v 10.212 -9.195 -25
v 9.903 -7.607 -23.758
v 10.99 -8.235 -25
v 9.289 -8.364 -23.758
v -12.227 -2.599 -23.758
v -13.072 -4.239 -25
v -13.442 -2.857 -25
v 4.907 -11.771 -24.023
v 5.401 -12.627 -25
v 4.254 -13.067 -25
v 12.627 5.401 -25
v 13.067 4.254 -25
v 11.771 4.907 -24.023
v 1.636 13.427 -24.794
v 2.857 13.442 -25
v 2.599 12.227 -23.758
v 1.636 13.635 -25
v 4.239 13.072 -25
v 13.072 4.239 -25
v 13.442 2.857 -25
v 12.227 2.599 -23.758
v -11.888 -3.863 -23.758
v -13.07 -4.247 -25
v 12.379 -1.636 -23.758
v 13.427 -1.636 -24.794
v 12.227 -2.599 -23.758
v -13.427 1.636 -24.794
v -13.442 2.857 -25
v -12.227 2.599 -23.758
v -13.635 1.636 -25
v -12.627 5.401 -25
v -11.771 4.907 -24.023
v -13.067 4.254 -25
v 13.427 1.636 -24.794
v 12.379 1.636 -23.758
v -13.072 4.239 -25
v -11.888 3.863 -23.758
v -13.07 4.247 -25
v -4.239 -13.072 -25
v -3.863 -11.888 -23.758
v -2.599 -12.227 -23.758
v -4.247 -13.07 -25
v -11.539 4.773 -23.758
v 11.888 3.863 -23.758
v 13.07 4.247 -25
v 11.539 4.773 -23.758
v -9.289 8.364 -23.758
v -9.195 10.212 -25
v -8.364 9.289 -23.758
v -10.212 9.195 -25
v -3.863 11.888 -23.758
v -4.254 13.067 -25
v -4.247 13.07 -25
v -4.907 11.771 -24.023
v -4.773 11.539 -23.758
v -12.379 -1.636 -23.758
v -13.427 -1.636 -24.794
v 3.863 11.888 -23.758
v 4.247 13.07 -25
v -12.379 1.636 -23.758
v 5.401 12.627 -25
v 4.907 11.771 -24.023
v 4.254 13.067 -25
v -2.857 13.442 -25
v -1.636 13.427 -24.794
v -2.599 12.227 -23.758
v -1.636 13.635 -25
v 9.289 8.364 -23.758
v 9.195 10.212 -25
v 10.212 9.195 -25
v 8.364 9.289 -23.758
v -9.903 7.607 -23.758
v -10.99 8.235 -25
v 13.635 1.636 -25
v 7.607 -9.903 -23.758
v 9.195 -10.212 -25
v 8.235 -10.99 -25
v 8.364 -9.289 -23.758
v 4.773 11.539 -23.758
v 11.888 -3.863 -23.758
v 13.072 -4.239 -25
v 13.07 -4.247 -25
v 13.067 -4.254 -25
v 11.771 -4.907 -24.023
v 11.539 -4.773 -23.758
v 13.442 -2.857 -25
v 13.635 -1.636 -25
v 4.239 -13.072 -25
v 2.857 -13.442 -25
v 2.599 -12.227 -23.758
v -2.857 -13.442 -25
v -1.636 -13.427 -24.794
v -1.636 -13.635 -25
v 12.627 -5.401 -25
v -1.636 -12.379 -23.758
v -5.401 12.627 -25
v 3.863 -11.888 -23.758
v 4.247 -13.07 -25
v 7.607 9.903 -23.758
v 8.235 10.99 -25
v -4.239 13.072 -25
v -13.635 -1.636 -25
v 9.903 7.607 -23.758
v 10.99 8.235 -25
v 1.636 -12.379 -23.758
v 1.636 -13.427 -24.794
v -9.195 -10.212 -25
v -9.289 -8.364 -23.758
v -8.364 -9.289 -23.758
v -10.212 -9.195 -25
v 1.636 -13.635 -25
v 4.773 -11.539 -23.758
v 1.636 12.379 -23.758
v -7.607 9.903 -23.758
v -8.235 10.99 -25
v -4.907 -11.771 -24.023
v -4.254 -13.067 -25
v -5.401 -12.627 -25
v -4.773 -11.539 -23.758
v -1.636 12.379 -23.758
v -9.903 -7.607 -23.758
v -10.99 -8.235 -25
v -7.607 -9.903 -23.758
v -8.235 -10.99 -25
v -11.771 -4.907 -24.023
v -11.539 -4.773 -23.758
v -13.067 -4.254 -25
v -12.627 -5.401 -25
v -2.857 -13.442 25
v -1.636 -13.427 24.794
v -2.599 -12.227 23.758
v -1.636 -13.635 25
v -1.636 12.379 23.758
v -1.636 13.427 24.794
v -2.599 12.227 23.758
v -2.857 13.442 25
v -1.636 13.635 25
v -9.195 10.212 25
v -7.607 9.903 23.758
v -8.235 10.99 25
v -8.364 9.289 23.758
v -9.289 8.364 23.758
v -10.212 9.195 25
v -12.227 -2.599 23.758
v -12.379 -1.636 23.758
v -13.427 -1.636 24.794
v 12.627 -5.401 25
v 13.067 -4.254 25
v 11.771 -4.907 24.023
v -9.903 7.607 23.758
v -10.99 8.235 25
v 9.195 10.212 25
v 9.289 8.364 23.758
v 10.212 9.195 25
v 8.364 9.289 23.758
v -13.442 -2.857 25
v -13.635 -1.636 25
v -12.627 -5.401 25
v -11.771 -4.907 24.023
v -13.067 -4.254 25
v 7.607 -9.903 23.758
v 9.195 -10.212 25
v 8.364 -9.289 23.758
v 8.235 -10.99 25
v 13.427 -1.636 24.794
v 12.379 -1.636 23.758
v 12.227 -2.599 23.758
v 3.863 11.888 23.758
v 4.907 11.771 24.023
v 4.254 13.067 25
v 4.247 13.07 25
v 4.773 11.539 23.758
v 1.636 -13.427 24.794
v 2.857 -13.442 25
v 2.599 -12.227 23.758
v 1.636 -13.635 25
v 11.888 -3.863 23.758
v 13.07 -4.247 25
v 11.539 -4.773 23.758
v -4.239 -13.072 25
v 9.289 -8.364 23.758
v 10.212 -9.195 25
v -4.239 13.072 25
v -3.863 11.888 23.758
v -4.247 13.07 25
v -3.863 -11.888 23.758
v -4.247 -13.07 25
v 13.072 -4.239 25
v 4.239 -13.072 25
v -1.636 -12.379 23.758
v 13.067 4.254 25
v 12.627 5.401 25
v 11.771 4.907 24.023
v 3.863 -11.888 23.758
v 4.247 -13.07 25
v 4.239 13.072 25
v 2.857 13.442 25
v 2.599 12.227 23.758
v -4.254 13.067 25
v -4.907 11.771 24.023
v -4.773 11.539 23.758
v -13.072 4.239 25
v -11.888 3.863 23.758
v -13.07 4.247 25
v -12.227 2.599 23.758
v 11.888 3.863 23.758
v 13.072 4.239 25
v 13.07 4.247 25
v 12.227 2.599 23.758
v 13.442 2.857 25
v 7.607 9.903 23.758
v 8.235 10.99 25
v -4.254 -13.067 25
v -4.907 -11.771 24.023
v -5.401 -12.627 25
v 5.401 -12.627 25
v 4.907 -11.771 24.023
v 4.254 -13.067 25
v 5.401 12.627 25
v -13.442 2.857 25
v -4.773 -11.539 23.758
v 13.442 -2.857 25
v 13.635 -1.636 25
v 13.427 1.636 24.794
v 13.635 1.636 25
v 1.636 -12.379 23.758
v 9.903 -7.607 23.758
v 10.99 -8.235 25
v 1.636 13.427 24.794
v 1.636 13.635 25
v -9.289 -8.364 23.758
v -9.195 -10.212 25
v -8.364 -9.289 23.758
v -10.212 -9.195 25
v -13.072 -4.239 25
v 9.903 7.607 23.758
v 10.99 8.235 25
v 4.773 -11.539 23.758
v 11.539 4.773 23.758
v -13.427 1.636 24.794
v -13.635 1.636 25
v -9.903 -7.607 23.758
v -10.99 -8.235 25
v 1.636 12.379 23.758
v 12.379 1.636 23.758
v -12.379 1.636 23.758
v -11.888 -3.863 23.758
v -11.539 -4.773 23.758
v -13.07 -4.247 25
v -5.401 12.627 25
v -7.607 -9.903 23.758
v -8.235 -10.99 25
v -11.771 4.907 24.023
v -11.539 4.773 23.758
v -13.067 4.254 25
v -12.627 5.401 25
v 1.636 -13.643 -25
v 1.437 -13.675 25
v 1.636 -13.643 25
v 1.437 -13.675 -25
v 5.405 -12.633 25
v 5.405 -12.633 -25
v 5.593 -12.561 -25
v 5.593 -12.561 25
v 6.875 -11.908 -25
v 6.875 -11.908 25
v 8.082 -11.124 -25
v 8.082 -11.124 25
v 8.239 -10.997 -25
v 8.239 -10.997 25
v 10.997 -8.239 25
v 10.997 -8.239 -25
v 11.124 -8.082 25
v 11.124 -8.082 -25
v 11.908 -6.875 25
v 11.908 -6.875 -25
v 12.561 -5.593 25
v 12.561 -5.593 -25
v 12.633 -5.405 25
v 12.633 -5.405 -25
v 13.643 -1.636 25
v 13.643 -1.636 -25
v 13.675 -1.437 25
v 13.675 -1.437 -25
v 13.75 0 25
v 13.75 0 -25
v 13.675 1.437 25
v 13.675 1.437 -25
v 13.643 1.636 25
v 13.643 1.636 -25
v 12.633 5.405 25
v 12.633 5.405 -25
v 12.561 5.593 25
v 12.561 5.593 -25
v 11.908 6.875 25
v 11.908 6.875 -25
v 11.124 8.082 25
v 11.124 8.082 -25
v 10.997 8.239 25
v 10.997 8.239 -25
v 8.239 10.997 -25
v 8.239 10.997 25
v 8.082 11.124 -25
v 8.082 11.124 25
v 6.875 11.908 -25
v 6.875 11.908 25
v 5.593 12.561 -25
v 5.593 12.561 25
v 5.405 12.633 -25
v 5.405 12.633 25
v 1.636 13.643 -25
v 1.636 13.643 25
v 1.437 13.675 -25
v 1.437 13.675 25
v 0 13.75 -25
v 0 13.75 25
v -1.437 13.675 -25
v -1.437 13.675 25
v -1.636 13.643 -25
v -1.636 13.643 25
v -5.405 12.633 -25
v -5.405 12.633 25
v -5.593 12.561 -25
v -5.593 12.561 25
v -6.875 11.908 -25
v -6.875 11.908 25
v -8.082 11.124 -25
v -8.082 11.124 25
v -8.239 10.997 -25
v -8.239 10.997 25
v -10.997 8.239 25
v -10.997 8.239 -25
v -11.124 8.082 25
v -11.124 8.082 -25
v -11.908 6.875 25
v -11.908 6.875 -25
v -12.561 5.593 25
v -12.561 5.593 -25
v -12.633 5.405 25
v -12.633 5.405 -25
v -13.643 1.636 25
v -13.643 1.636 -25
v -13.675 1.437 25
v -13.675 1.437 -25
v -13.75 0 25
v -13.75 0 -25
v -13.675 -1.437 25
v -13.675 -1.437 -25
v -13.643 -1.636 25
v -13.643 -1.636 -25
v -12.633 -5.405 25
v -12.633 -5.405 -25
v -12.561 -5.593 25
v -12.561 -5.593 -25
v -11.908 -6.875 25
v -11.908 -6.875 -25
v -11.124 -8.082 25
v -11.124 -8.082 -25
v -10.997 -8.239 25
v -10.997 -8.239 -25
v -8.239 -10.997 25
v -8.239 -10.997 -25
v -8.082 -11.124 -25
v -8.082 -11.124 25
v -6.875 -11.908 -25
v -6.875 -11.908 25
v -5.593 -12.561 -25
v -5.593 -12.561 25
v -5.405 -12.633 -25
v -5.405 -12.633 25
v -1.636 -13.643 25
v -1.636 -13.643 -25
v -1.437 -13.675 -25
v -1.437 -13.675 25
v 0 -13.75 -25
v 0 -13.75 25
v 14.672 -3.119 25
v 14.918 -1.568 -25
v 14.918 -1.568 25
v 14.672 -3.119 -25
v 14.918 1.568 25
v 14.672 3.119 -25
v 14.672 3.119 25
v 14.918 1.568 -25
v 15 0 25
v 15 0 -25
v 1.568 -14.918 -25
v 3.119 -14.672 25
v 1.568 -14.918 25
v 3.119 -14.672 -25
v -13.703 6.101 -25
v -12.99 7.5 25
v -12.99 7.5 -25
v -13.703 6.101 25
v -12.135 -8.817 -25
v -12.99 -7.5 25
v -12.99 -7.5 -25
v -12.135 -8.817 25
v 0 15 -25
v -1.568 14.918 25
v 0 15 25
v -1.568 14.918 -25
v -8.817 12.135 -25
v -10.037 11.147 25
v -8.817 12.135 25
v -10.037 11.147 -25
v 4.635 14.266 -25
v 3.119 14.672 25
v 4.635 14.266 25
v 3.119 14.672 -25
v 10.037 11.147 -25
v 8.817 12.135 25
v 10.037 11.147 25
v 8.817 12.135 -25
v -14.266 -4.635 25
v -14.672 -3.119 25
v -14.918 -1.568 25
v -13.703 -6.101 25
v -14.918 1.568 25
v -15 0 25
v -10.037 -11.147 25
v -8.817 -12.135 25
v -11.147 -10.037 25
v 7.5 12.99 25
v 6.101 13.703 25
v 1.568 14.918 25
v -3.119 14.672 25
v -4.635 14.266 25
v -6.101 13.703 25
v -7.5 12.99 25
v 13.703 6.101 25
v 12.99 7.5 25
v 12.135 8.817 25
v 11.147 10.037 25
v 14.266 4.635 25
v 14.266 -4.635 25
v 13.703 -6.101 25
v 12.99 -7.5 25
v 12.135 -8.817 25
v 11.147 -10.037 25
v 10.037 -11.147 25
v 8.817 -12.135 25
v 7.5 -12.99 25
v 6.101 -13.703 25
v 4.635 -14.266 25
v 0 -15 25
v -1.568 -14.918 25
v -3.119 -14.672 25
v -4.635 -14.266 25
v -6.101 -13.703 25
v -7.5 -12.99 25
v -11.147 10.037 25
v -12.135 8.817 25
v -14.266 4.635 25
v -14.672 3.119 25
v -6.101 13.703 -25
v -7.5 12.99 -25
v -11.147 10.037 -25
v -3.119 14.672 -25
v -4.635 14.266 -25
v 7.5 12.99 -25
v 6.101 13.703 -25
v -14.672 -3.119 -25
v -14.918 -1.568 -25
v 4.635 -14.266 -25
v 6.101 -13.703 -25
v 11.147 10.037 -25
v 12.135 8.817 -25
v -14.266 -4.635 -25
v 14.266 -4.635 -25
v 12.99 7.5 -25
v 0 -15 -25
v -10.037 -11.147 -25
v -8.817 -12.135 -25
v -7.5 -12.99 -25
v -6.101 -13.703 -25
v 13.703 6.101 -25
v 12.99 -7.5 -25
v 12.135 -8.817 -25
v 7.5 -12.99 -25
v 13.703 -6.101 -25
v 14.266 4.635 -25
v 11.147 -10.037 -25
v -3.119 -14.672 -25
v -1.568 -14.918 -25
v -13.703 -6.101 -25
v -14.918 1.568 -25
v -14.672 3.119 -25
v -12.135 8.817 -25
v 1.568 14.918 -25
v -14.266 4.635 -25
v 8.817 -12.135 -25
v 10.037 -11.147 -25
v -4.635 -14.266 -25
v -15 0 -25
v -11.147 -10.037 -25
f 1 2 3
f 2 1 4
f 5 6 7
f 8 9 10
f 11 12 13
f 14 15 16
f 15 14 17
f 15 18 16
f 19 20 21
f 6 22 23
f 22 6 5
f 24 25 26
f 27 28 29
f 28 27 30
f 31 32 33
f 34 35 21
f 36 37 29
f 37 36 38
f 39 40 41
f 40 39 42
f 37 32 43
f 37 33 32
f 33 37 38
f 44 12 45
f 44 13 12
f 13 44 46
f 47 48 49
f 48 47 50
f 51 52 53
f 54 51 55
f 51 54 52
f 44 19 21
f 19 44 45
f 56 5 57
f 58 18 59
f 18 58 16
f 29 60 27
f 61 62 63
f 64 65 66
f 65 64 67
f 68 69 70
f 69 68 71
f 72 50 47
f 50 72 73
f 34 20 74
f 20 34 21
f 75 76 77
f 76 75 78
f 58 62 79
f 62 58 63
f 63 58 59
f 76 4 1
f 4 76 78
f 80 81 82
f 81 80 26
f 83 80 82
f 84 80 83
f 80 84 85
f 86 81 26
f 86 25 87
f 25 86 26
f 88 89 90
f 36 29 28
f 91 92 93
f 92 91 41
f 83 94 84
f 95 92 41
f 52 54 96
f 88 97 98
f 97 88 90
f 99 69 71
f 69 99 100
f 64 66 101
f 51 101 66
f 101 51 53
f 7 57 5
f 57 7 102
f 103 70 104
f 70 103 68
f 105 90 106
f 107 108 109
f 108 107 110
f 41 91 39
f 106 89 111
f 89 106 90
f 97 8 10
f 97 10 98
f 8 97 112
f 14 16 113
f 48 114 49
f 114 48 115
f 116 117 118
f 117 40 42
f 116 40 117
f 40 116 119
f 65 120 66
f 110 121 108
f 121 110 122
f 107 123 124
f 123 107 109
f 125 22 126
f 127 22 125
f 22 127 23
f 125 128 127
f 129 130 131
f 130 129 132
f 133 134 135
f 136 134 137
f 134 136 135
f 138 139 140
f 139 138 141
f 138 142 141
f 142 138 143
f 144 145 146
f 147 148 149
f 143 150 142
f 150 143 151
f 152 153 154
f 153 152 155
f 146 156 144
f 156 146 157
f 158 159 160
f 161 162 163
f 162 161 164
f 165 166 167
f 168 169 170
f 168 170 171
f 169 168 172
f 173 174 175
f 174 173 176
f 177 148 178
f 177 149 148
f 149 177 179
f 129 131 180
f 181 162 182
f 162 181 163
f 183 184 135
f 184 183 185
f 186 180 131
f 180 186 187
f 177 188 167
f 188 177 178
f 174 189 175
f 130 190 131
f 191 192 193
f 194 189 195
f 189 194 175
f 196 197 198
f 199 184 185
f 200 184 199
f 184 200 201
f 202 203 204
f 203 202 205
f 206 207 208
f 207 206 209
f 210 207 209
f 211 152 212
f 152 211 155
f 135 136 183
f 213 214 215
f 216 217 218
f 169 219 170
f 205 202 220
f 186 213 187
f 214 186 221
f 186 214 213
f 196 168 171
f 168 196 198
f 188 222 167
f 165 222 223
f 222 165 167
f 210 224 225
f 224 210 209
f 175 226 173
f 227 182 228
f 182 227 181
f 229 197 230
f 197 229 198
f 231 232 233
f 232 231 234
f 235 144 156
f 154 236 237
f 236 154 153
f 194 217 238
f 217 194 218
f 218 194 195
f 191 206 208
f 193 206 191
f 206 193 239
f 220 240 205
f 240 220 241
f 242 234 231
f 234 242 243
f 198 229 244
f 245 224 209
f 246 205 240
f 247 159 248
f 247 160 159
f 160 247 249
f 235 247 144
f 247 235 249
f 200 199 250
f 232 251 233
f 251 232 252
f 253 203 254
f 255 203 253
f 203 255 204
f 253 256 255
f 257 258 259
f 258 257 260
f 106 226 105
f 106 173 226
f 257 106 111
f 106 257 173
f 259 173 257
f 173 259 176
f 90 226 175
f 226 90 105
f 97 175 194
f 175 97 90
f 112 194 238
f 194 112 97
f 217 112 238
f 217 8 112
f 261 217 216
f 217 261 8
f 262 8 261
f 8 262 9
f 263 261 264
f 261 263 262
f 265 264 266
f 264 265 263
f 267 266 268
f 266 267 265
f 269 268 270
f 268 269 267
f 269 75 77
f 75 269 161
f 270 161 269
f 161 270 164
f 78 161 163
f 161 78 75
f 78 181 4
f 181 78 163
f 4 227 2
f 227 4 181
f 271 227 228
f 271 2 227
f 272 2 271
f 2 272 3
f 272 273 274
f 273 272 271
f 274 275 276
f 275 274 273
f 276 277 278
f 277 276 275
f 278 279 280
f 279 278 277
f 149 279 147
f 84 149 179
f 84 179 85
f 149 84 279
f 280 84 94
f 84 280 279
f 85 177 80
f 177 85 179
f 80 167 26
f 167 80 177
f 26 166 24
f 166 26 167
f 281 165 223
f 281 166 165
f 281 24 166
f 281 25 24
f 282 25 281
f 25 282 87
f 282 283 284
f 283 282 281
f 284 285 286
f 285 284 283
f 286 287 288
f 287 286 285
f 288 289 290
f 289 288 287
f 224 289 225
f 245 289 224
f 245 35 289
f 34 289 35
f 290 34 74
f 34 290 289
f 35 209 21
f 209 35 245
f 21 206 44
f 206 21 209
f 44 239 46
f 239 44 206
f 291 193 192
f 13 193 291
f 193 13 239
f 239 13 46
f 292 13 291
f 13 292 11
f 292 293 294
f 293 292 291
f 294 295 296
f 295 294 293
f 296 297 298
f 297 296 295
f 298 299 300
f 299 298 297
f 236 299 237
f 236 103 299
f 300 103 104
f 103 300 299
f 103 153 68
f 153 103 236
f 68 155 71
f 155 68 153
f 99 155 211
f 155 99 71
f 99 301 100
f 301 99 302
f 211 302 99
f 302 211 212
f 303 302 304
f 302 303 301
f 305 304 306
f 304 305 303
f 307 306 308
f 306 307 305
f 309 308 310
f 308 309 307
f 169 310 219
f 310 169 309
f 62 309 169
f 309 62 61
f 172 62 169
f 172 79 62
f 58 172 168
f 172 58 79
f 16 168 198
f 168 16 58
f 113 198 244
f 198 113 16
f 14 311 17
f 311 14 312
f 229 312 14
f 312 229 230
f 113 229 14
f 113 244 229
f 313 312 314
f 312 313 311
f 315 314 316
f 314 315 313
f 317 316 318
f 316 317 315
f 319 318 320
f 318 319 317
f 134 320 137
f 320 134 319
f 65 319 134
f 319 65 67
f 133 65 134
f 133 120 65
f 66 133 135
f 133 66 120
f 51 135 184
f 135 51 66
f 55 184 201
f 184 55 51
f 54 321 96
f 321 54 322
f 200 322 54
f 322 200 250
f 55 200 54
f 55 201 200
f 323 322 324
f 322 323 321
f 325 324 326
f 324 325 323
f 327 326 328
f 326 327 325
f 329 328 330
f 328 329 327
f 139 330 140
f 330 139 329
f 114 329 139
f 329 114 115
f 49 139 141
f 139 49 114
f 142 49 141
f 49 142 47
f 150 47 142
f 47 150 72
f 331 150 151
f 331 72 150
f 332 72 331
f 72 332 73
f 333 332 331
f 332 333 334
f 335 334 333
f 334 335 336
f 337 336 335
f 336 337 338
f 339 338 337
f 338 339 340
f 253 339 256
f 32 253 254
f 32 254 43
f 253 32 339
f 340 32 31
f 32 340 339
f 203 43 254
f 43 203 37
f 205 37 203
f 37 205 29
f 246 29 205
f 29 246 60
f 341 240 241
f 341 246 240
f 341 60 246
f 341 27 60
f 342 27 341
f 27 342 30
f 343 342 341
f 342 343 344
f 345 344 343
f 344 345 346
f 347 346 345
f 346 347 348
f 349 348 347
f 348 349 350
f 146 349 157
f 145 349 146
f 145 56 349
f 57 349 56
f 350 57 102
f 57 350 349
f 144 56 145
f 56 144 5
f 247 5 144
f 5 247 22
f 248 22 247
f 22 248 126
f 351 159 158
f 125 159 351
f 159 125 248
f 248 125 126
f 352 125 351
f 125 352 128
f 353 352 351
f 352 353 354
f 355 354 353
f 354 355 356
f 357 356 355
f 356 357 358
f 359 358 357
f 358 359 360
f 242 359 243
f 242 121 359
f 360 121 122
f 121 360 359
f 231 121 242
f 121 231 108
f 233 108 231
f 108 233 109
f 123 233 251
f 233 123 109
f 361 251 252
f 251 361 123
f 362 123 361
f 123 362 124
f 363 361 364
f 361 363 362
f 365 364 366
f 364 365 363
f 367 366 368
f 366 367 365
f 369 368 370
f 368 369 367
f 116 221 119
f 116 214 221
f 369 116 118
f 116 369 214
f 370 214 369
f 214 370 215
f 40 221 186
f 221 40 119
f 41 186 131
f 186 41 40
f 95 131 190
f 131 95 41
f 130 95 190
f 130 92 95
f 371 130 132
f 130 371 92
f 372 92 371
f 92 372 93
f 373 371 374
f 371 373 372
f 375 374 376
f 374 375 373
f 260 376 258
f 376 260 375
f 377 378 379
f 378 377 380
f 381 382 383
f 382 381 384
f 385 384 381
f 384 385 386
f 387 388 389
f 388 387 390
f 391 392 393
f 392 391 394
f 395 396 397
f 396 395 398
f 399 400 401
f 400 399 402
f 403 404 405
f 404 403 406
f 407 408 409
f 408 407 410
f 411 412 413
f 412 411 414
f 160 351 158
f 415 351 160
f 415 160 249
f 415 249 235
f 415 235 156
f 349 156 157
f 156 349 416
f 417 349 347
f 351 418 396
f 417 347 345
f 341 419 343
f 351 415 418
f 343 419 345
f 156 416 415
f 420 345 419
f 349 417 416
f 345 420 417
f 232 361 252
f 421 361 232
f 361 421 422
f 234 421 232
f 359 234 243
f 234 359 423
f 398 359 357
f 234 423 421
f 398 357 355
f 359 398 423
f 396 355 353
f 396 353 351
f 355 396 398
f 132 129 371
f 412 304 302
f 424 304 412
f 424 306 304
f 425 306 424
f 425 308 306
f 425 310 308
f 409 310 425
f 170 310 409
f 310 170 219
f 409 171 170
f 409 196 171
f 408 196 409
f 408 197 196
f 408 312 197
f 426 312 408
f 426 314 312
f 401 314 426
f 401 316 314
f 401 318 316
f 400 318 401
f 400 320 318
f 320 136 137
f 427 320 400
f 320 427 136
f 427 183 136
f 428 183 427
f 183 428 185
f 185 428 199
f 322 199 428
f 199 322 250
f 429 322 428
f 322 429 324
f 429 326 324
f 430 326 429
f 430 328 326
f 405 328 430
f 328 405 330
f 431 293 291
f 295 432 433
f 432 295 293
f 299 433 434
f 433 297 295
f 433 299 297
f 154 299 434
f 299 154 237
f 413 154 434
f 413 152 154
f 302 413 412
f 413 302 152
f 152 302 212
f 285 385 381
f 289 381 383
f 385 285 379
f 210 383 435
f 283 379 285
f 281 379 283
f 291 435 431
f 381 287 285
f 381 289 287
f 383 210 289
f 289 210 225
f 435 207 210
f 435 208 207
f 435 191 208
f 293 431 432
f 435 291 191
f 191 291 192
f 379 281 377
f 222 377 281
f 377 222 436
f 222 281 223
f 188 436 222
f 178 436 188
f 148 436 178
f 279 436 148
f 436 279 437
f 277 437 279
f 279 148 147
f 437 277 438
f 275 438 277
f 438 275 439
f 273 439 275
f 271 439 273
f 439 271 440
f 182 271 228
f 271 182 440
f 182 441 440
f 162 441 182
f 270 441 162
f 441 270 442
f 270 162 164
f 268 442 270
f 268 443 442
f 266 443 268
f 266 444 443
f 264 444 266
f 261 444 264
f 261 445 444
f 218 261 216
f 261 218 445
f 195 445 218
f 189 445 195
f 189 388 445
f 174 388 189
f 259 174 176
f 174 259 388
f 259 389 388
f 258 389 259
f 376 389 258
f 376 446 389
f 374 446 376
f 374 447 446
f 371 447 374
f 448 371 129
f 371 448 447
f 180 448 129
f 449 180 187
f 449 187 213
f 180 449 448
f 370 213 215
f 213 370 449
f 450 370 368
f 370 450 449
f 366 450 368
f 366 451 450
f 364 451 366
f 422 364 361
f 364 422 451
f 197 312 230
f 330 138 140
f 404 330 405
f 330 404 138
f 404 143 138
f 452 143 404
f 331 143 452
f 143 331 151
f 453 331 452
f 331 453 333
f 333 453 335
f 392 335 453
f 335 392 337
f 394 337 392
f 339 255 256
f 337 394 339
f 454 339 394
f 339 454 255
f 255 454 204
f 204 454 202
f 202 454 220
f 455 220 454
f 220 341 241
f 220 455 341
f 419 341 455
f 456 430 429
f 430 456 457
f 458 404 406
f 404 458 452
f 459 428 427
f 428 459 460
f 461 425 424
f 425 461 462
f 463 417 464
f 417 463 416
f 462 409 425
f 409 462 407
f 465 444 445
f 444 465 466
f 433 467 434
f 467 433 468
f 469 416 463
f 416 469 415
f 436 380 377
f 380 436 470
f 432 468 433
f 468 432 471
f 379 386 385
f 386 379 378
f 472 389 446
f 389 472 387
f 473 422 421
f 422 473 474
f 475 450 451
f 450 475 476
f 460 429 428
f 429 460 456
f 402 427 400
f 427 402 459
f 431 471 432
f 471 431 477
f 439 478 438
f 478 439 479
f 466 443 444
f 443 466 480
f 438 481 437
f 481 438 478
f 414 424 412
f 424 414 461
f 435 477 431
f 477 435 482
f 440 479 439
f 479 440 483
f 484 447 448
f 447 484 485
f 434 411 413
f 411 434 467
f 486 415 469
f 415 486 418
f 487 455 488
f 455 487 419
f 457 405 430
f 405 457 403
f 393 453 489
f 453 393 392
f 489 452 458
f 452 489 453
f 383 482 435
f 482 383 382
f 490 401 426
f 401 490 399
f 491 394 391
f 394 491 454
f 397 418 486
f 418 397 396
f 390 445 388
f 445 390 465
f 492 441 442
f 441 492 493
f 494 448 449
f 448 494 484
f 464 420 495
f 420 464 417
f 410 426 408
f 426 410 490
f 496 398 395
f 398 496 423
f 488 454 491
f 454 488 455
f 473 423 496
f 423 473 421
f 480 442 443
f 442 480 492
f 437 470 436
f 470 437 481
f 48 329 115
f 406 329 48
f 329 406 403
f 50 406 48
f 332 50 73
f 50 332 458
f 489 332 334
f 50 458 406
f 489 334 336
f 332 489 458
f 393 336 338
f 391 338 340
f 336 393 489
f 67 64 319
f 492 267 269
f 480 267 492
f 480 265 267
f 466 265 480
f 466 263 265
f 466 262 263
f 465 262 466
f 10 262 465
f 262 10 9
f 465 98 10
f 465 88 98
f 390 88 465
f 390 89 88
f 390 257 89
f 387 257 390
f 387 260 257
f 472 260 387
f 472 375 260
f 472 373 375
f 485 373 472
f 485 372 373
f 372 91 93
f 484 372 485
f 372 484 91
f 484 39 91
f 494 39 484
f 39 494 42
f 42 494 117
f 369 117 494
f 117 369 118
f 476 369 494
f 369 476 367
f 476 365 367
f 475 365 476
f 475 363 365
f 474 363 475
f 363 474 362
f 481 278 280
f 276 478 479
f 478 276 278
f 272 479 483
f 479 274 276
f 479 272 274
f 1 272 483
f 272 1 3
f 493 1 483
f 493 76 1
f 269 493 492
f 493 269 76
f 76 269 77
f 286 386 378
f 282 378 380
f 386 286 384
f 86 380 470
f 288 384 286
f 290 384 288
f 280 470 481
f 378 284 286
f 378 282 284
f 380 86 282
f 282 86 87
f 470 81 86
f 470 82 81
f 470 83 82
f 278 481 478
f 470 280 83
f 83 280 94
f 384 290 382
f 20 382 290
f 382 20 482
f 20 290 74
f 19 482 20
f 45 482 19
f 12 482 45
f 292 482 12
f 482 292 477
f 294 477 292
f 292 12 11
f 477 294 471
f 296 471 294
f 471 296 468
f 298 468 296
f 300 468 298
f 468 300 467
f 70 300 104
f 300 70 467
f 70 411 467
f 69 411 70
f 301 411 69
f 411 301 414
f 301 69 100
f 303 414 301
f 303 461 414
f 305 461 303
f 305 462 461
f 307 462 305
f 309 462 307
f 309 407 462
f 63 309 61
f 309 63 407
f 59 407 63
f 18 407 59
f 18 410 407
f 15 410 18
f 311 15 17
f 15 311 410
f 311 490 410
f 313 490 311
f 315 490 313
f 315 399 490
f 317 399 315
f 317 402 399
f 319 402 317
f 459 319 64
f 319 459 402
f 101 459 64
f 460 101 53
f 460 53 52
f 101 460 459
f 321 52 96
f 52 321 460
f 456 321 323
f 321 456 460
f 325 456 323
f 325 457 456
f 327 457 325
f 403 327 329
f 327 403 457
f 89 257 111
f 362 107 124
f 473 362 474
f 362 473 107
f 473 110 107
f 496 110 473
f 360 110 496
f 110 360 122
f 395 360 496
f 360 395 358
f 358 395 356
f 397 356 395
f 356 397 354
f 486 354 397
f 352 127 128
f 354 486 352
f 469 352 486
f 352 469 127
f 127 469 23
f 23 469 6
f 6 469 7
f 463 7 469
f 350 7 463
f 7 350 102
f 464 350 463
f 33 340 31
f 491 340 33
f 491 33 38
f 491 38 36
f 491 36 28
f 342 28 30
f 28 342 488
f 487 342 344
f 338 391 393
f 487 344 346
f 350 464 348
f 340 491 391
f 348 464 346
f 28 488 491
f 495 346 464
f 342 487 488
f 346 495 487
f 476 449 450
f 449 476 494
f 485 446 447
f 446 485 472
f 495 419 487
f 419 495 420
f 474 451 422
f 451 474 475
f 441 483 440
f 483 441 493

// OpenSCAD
// file: bushing_common.scad
include <../globals.scad>

// The drawing of bushing bore
module bushing_bore_sketch(
    inner_radius,
    outer_radius,
    pin_count=12,
    pin_bore_coverage=0.5
) {
    assert(pin_bore_coverage >= 0);
    assert(pin_bore_coverage <= 1);
    assert(pin_count >= 3);
    
    pin_width =  (1 - pin_bore_coverage) * 2 * PI * inner_radius / pin_count;
    pin_length = outer_radius;
   
    // create the rod
    circle(r=inner_radius);
    
    if(outer_radius > inner_radius) {
        // create the pins
        intersection() {
            // pins
            for(a=[0:360/pin_count:360])
                rotate(a)
                    translate([0,-pin_width/2])
                        square([pin_length, pin_width]);
            // round over pin ends
            circle(outer_radius);
        }
    }
}

// The bore as a volume
module bushing_bore(
    inner_radius,
    outer_radius,
    height,
    pin_count,
    pin_bore_coverage,
    chamfer
) {
    chamfer = default(chamfer, outer_radius - inner_radius);

    // Bore body
    linear_extrude(height, center=true)
        bushing_bore_sketch(
            inner_radius=inner_radius,
            outer_radius=outer_radius,
            pin_count=pin_count,
            pin_bore_coverage=pin_bore_coverage
        );
    
    if(chamfer > 0) {
        // Lower chamfer
        translate([0,0, - height / 2])
        cylinder(chamfer, r1=inner_radius + chamfer, r2=inner_radius);
        
        // Upper chamfer
        rotate([180,0,0])
        translate([0,0, - height / 2])
        cylinder(chamfer, r1=inner_radius + chamfer, r2=inner_radius);
    }
}
// file: ../globals.scad
$fa = $preview? 12 : 6;
$fs = $preview? 2 : 0.2;

EPS = 1/128;

LAYER_HEIGHT = 0.2;

function default(v, d) = is_undef(v)? d : v;

// For engraving in all planes except those parrallel to XY.
module v_engrave(t, size=10) {
    translate([0, 0.3, 0])
    rotate([90,0,0])
    linear_extrude(0.3 + EPS)
    text(t, size=size, font="DejaVu Sans:style=Book", valign="center", halign="center");
}

// For engraving in all planes parrallel to XY.
module h_engrave(t, size=10) {
    translate([0, 0, -0.7])
    linear_extrude(0.7 + EPS)
    text(t, size=size, font="DejaVu Sans:style=Book", valign="center", halign="center");
}
// main file
// The outer diameter of the bushing
DIAMETER = 30;

// The height of the bushing
HEIGHT = 50;

BORE_DIAMETER = 25;

// How high the pins should be (0 to disable)
PIN_HEIGHT = 1.25;

// The amount of pins connecting to the rod
PINS = 12; // [3:100]

// Percentage of bore covered by pins (if PIN WIDTH = 0)
PIN_BORE_COVERAGE = 0.5; // [0:0.01:1.01]

// The distance which should be chamfered
CHAMFER = 1.25;

include <../globals.scad>;
use <bushing_common.scad>;

module bsc(
            bushing_radius=DIAMETER/2,
            bore_radius=BORE_DIAMETER/2,
            height=HEIGHT,
            pin_count=PINS,
            pin_bore_coverage=PIN_BORE_COVERAGE,
            pin_height=PIN_HEIGHT,
            chamfer=CHAMFER
           ) {
               
    assert(bushing_radius > bore_radius + pin_height);
               
    difference() {
        cylinder(height, r=bushing_radius, center=true);
        
        bushing_bore(
            inner_radius=bore_radius,
            outer_radius=bore_radius + pin_height,
            height=HEIGHT + 2 * EPS,
            pin_count=pin_count,
            pin_bore_coverage=pin_bore_coverage,
            chamfer=chamfer
        );
    }
}

bsc();
